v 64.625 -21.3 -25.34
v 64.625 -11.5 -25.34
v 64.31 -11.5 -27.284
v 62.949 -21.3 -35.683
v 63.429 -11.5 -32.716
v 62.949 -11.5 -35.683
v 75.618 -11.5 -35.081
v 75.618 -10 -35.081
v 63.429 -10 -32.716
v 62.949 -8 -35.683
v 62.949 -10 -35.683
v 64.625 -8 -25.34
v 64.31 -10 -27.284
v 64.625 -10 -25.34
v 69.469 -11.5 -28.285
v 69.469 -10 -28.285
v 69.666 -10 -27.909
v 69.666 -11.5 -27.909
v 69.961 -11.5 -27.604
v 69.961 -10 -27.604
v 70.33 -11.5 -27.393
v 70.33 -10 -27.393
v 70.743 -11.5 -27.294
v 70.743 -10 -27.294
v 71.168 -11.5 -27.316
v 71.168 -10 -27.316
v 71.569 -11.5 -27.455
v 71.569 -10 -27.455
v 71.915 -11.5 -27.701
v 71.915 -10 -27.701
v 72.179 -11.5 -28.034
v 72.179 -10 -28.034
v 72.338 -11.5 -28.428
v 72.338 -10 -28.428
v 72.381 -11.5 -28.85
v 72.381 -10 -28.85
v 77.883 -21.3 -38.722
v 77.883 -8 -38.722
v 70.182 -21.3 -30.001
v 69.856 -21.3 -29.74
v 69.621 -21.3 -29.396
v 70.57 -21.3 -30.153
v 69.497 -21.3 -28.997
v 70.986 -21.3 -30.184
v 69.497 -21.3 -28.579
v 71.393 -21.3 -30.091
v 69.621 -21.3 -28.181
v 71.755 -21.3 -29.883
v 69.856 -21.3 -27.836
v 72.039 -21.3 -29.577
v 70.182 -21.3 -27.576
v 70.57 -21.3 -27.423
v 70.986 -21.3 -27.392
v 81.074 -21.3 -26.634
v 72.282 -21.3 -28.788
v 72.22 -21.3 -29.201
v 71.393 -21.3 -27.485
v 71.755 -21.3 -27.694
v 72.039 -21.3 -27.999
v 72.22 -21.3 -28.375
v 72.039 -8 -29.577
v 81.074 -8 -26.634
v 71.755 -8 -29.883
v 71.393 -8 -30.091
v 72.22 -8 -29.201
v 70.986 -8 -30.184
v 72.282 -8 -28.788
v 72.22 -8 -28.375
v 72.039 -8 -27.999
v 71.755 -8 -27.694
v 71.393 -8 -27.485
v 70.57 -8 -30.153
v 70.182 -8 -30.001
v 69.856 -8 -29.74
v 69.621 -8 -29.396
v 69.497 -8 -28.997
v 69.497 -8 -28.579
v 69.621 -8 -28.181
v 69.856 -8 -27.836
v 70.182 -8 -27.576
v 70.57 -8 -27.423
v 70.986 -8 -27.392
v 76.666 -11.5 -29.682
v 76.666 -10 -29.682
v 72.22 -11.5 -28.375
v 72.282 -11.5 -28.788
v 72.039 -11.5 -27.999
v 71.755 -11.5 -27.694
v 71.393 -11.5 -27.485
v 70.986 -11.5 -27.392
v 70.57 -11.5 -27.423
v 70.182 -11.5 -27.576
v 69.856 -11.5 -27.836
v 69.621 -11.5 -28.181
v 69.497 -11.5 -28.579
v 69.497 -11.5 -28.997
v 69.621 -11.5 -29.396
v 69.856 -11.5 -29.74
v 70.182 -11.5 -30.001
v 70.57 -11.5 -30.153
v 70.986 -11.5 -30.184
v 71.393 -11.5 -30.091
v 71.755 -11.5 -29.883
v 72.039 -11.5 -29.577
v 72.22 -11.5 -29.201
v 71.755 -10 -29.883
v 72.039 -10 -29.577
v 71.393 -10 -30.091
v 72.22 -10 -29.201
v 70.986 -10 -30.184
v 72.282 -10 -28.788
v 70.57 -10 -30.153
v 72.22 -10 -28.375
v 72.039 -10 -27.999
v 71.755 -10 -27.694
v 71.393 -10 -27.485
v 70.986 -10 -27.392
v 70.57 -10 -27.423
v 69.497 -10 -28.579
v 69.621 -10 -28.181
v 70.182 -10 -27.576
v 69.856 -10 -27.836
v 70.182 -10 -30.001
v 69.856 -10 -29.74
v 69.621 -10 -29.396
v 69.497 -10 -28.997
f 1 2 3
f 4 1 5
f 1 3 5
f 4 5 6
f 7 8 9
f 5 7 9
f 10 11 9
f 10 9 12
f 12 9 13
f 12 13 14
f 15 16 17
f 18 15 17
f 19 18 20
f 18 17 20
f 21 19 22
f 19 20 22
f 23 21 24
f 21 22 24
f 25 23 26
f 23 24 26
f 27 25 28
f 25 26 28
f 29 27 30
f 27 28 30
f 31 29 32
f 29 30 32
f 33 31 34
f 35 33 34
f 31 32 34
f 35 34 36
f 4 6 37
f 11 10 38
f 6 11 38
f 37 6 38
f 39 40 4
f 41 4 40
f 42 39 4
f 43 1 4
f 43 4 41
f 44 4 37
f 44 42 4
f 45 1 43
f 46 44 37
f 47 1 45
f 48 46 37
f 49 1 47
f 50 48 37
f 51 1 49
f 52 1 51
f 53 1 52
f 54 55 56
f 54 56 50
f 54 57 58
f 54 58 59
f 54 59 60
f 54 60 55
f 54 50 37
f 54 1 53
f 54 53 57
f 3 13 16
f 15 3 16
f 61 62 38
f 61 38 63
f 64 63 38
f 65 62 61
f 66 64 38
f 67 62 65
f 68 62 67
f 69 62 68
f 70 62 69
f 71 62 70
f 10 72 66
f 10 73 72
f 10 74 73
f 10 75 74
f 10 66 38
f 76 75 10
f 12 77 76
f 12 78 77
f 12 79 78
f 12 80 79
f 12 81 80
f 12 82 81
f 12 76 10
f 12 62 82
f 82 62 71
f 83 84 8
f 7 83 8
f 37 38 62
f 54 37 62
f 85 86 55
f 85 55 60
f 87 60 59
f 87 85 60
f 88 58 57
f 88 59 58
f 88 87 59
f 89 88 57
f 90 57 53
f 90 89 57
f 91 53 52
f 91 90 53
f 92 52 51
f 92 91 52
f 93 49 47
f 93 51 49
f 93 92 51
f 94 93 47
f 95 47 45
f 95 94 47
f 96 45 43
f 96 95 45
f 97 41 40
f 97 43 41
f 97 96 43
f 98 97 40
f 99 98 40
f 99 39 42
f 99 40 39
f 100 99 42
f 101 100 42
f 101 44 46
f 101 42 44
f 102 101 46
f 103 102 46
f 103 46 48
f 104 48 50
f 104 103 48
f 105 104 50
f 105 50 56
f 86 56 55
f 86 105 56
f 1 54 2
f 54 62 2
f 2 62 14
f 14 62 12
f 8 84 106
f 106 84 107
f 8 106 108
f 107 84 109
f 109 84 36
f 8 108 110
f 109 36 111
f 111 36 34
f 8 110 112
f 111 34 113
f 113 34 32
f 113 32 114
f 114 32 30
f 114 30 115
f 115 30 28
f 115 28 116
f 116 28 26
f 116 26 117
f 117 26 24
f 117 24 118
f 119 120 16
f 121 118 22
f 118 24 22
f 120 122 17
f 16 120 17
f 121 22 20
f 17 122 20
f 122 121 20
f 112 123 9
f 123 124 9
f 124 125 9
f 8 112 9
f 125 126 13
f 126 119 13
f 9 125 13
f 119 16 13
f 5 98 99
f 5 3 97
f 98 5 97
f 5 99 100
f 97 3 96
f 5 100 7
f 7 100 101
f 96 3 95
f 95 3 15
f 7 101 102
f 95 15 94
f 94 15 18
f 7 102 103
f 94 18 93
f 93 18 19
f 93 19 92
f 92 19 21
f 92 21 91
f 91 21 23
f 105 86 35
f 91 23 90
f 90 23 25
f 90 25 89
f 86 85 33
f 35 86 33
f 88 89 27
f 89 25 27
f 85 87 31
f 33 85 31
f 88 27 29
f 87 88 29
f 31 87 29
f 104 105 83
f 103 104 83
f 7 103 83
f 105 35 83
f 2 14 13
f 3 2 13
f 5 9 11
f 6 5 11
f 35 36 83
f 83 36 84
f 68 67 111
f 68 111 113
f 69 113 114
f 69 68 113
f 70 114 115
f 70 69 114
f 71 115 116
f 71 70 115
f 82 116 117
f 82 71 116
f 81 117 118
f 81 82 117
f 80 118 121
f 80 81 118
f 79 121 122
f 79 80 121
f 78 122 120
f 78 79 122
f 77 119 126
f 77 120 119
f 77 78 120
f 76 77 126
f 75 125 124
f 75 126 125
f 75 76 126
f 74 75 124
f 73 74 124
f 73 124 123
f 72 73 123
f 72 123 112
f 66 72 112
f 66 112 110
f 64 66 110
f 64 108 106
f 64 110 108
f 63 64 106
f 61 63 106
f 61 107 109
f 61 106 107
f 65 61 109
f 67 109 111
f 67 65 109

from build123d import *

# Parameters (mm, degrees)
F0_R      = 7.5
F1_DEPTH  = 10
F4_DEPTH  = 1.5
F6_DEPTH  = 2
F8_DEPTH  = 9.8
F10_DEPTH = 25


with BuildPart() as f1:
    # F0 (on Front) → F1 (new body)
    with BuildSketch(Plane.XZ):
        Circle(F0_R)
        with BuildLine():
            ThreePointArc((-0.1283063228, 4.3981288621), (0, 4.4), (0.1283063228, 4.3981288621))
            ThreePointArc((0.1283063228, 4.3981288621), (0.2239147081, 4.4290007991), (0.2785931947, 4.5132878262))
            Line((0.2785931947, 4.5132878262), (0.4192344048, 5.1033676473))
            ThreePointArc((0.4192344048, 5.1033676473), (0.478862258, 5.1912888485), (0.5817691739, 5.2176665885))
            ThreePointArc((0.5817691739, 5.2176665885), (1.0242241906, 5.1491227221), (1.4592299266, 5.0431287929))
            ThreePointArc((1.4592299266, 5.0431287929), (1.5442091959, 4.979378167), (1.565652162, 4.8753309772))
            Line((1.565652162, 4.8753309772), (1.4697739261, 4.276347247))
            ThreePointArc((1.4697739261, 4.276347247), (1.4880350119, 4.1775516368), (1.5645514634, 4.112441941))
            ThreePointArc((1.5645514634, 4.112441941), (1.6838071024, 4.065069943), (1.8016306345, 4.014240533))
            ThreePointArc((1.8016306345, 4.014240533), (1.9017754436, 4.0061747387), (1.9845470271, 4.063121247))
            Line((1.9845470271, 4.063121247), (2.3402963338, 4.5544628552))
            ThreePointArc((2.3402963338, 4.5544628552), (2.429031274, 4.612872862), (2.5341991914, 4.5978619442))
            ThreePointArc((2.5341991914, 4.5978619442), (2.9167437234, 4.3652154646), (3.2780744987, 4.1008203546))
            ThreePointArc((3.2780744987, 4.1008203546), (3.332188798, 4.0094022978), (3.3121823798, 3.9050693608))
            Line((3.3121823798, 3.9050693608), (2.9943812902, 3.3883715646))
            ThreePointArc((2.9943812902, 3.3883715646), (2.9734448904, 3.2901081075), (3.019220472, 3.2006730138))
            ThreePointArc((3.019220472, 3.2006730138), (3.1112698372, 3.1112698372), (3.2006730138, 3.019220472))
            ThreePointArc((3.2006730138, 3.019220472), (3.2901081075, 2.9734448904), (3.3883715646, 2.9943812902))
            Line((3.3883715646, 2.9943812902), (3.9050693608, 3.3121823798))
            ThreePointArc((3.9050693608, 3.3121823798), (4.0094022978, 3.332188798), (4.1008203546, 3.2780744987))
            ThreePointArc((4.1008203546, 3.2780744987), (4.3652154646, 2.9167437234), (4.5978619442, 2.5341991914))
            ThreePointArc((4.5978619442, 2.5341991914), (4.612872862, 2.429031274), (4.5544628552, 2.3402963338))
            Line((4.5544628552, 2.3402963338), (4.063121247, 1.9845470271))
            ThreePointArc((4.063121247, 1.9845470271), (4.0061747387, 1.9017754436), (4.014240533, 1.8016306345))
            ThreePointArc((4.014240533, 1.8016306345), (4.065069943, 1.6838071024), (4.112441941, 1.5645514634))
            ThreePointArc((4.112441941, 1.5645514634), (4.1775516368, 1.4880350119), (4.276347247, 1.4697739261))
            Line((4.276347247, 1.4697739261), (4.8753309772, 1.565652162))
            ThreePointArc((4.8753309772, 1.565652162), (4.979378167, 1.5442091959), (5.0431287929, 1.4592299266))
            ThreePointArc((5.0431287929, 1.4592299266), (5.1491227221, 1.0242241906), (5.2176665885, 0.5817691739))
            ThreePointArc((5.2176665885, 0.5817691739), (5.1912888485, 0.478862258), (5.1033676473, 0.4192344048))
            Line((5.1033676473, 0.4192344048), (4.5132878262, 0.2785931947))
            ThreePointArc((4.5132878262, 0.2785931947), (4.4290007991, 0.2239147081), (4.3981288621, 0.1283063228))
            ThreePointArc((4.3981288621, 0.1283063228), (4.4, 0), (4.3981288621, -0.1283063228))
            ThreePointArc((4.3981288621, -0.1283063228), (4.4290007991, -0.2239147081), (4.5132878262, -0.2785931947))
            Line((4.5132878262, -0.2785931947), (5.1033676473, -0.4192344048))
            ThreePointArc((5.1033676473, -0.4192344048), (5.1912888485, -0.478862258), (5.2176665885, -0.5817691739))
            ThreePointArc((5.2176665885, -0.5817691739), (5.1491227221, -1.0242241906), (5.0431287929, -1.4592299266))
            ThreePointArc((5.0431287929, -1.4592299266), (4.979378167, -1.5442091959), (4.8753309772, -1.565652162))
            Line((4.8753309772, -1.565652162), (4.276347247, -1.4697739261))
            ThreePointArc((4.276347247, -1.4697739261), (4.1775516368, -1.4880350119), (4.112441941, -1.5645514634))
            ThreePointArc((4.112441941, -1.5645514634), (4.065069943, -1.6838071024), (4.014240533, -1.8016306345))
            ThreePointArc((4.014240533, -1.8016306345), (4.0061747387, -1.9017754436), (4.063121247, -1.9845470271))
            Line((4.063121247, -1.9845470271), (4.5544628552, -2.3402963338))
            ThreePointArc((4.5544628552, -2.3402963338), (4.612872862, -2.429031274), (4.5978619442, -2.5341991914))
            ThreePointArc((4.5978619442, -2.5341991914), (4.3652154646, -2.9167437234), (4.1008203546, -3.2780744987))
            ThreePointArc((4.1008203546, -3.2780744987), (4.0094022978, -3.332188798), (3.9050693608, -3.3121823798))
            Line((3.9050693608, -3.3121823798), (3.3883715646, -2.9943812902))
            ThreePointArc((3.3883715646, -2.9943812902), (3.2901081075, -2.9734448904), (3.2006730138, -3.019220472))
            ThreePointArc((3.2006730138, -3.019220472), (3.1112698372, -3.1112698372), (3.019220472, -3.2006730138))
            ThreePointArc((3.019220472, -3.2006730138), (2.9734448904, -3.2901081075), (2.9943812902, -3.3883715646))
            Line((2.9943812902, -3.3883715646), (3.3121823798, -3.9050693608))
            ThreePointArc((3.3121823798, -3.9050693608), (3.332188798, -4.0094022978), (3.2780744987, -4.1008203546))
            ThreePointArc((3.2780744987, -4.1008203546), (2.9167437234, -4.3652154646), (2.5341991914, -4.5978619442))
            ThreePointArc((2.5341991914, -4.5978619442), (2.429031274, -4.612872862), (2.3402963338, -4.5544628552))
            Line((2.3402963338, -4.5544628552), (1.9845470271, -4.063121247))
            ThreePointArc((1.9845470271, -4.063121247), (1.9017754436, -4.0061747387), (1.8016306345, -4.014240533))
            ThreePointArc((1.8016306345, -4.014240533), (1.6838071024, -4.065069943), (1.5645514634, -4.112441941))
            ThreePointArc((1.5645514634, -4.112441941), (1.4880350119, -4.1775516368), (1.4697739261, -4.276347247))
            Line((1.4697739261, -4.276347247), (1.565652162, -4.8753309772))
            ThreePointArc((1.565652162, -4.8753309772), (1.5442091959, -4.979378167), (1.4592299266, -5.0431287929))
            ThreePointArc((1.4592299266, -5.0431287929), (1.0242241906, -5.1491227221), (0.5817691739, -5.2176665885))
            ThreePointArc((0.5817691739, -5.2176665885), (0.478862258, -5.1912888485), (0.4192344048, -5.1033676473))
            Line((0.4192344048, -5.1033676473), (0.2785931947, -4.5132878262))
            ThreePointArc((0.2785931947, -4.5132878262), (0.2239147081, -4.4290007991), (0.1283063228, -4.3981288621))
            ThreePointArc((0.1283063228, -4.3981288621), (0, -4.4), (-0.1283063228, -4.3981288621))
            ThreePointArc((-0.1283063228, -4.3981288621), (-0.2239147081, -4.4290007991), (-0.2785931947, -4.5132878262))
            Line((-0.2785931947, -4.5132878262), (-0.4192344048, -5.1033676473))
            ThreePointArc((-0.4192344048, -5.1033676473), (-0.478862258, -5.1912888485), (-0.5817691739, -5.2176665885))
            ThreePointArc((-0.5817691739, -5.2176665885), (-1.0242241906, -5.1491227221), (-1.4592299266, -5.0431287929))
            ThreePointArc((-1.4592299266, -5.0431287929), (-1.5442091959, -4.979378167), (-1.565652162, -4.8753309772))
            Line((-1.565652162, -4.8753309772), (-1.4697739261, -4.276347247))
            ThreePointArc((-1.4697739261, -4.276347247), (-1.4880350119, -4.1775516368), (-1.5645514634, -4.112441941))
            ThreePointArc((-1.5645514634, -4.112441941), (-1.6838071024, -4.065069943), (-1.8016306345, -4.014240533))
            ThreePointArc((-1.8016306345, -4.014240533), (-1.9017754436, -4.0061747387), (-1.9845470271, -4.063121247))
            Line((-1.9845470271, -4.063121247), (-2.3402963338, -4.5544628552))
            ThreePointArc((-2.3402963338, -4.5544628552), (-2.429031274, -4.612872862), (-2.5341991914, -4.5978619442))
            ThreePointArc((-2.5341991914, -4.5978619442), (-2.9167437234, -4.3652154646), (-3.2780744987, -4.1008203546))
            ThreePointArc((-3.2780744987, -4.1008203546), (-3.332188798, -4.0094022978), (-3.3121823798, -3.9050693608))
            Line((-3.3121823798, -3.9050693608), (-2.9943812902, -3.3883715646))
            ThreePointArc((-2.9943812902, -3.3883715646), (-2.9734448904, -3.2901081075), (-3.019220472, -3.2006730138))
            ThreePointArc((-3.019220472, -3.2006730138), (-3.1112698372, -3.1112698372), (-3.2006730138, -3.019220472))
            ThreePointArc((-3.2006730138, -3.019220472), (-3.2901081075, -2.9734448904), (-3.3883715646, -2.9943812902))
            Line((-3.3883715646, -2.9943812902), (-3.9050693608, -3.3121823798))
            ThreePointArc((-3.9050693608, -3.3121823798), (-4.0094022978, -3.332188798), (-4.1008203546, -3.2780744987))
            ThreePointArc((-4.1008203546, -3.2780744987), (-4.3652154646, -2.9167437234), (-4.5978619442, -2.5341991914))
            ThreePointArc((-4.5978619442, -2.5341991914), (-4.612872862, -2.429031274), (-4.5544628552, -2.3402963338))
            Line((-4.5544628552, -2.3402963338), (-4.063121247, -1.9845470271))
            ThreePointArc((-4.063121247, -1.9845470271), (-4.0061747387, -1.9017754436), (-4.014240533, -1.8016306345))
            ThreePointArc((-4.014240533, -1.8016306345), (-4.065069943, -1.6838071024), (-4.112441941, -1.5645514634))
            ThreePointArc((-4.112441941, -1.5645514634), (-4.1775516368, -1.4880350119), (-4.276347247, -1.4697739261))
            Line((-4.276347247, -1.4697739261), (-4.8753309772, -1.565652162))
            ThreePointArc((-4.8753309772, -1.565652162), (-4.979378167, -1.5442091959), (-5.0431287929, -1.4592299266))
            ThreePointArc((-5.0431287929, -1.4592299266), (-5.1491227221, -1.0242241906), (-5.2176665885, -0.5817691739))
            ThreePointArc((-5.2176665885, -0.5817691739), (-5.1912888485, -0.478862258), (-5.1033676473, -0.4192344048))
            Line((-5.1033676473, -0.4192344048), (-4.5132878262, -0.2785931947))
            ThreePointArc((-4.5132878262, -0.2785931947), (-4.4290007991, -0.2239147081), (-4.3981288621, -0.1283063228))
            ThreePointArc((-4.3981288621, -0.1283063228), (-4.4, 0), (-4.3981288621, 0.1283063228))
            ThreePointArc((-4.3981288621, 0.1283063228), (-4.4290007991, 0.2239147081), (-4.5132878262, 0.2785931947))
            Line((-4.5132878262, 0.2785931947), (-5.1033676473, 0.4192344048))
            ThreePointArc((-5.1033676473, 0.4192344048), (-5.1912888485, 0.478862258), (-5.2176665885, 0.5817691739))
            ThreePointArc((-5.2176665885, 0.5817691739), (-5.1491227221, 1.0242241906), (-5.0431287929, 1.4592299266))
            ThreePointArc((-5.0431287929, 1.4592299266), (-4.979378167, 1.5442091959), (-4.8753309772, 1.565652162))
            Line((-4.8753309772, 1.565652162), (-4.276347247, 1.4697739261))
            ThreePointArc((-4.276347247, 1.4697739261), (-4.1775516368, 1.4880350119), (-4.112441941, 1.5645514634))
            ThreePointArc((-4.112441941, 1.5645514634), (-4.065069943, 1.6838071024), (-4.014240533, 1.8016306345))
            ThreePointArc((-4.014240533, 1.8016306345), (-4.0061747387, 1.9017754436), (-4.063121247, 1.9845470271))
            Line((-4.063121247, 1.9845470271), (-4.5544628552, 2.3402963338))
            ThreePointArc((-4.5544628552, 2.3402963338), (-4.612872862, 2.429031274), (-4.5978619442, 2.5341991914))
            ThreePointArc((-4.5978619442, 2.5341991914), (-4.3652154646, 2.9167437234), (-4.1008203546, 3.2780744987))
            ThreePointArc((-4.1008203546, 3.2780744987), (-4.0094022978, 3.332188798), (-3.9050693608, 3.3121823798))
            Line((-3.9050693608, 3.3121823798), (-3.3883715646, 2.9943812902))
            ThreePointArc((-3.3883715646, 2.9943812902), (-3.2901081075, 2.9734448904), (-3.2006730138, 3.019220472))
            ThreePointArc((-3.2006730138, 3.019220472), (-3.1112698372, 3.1112698372), (-3.019220472, 3.2006730138))
            ThreePointArc((-3.019220472, 3.2006730138), (-2.9734448904, 3.2901081075), (-2.9943812902, 3.3883715646))
            Line((-2.9943812902, 3.3883715646), (-3.3121823798, 3.9050693608))
            ThreePointArc((-3.3121823798, 3.9050693608), (-3.332188798, 4.0094022978), (-3.2780744987, 4.1008203546))
            ThreePointArc((-3.2780744987, 4.1008203546), (-2.9167437234, 4.3652154646), (-2.5341991914, 4.5978619442))
            ThreePointArc((-2.5341991914, 4.5978619442), (-2.429031274, 4.612872862), (-2.3402963338, 4.5544628552))
            Line((-2.3402963338, 4.5544628552), (-1.9845470271, 4.063121247))
            ThreePointArc((-1.9845470271, 4.063121247), (-1.9017754436, 4.0061747387), (-1.8016306345, 4.014240533))
            ThreePointArc((-1.8016306345, 4.014240533), (-1.6838071024, 4.065069943), (-1.5645514634, 4.112441941))
            ThreePointArc((-1.5645514634, 4.112441941), (-1.4880350119, 4.1775516368), (-1.4697739261, 4.276347247))
            Line((-1.4697739261, 4.276347247), (-1.565652162, 4.8753309772))
            ThreePointArc((-1.565652162, 4.8753309772), (-1.5442091959, 4.979378167), (-1.4592299266, 5.0431287929))
            ThreePointArc((-1.4592299266, 5.0431287929), (-1.0242241906, 5.1491227221), (-0.5817691739, 5.2176665885))
            ThreePointArc((-0.5817691739, 5.2176665885), (-0.478862258, 5.1912888485), (-0.4192344048, 5.1033676473))
            Line((-0.4192344048, 5.1033676473), (-0.2785931947, 4.5132878262))
            ThreePointArc((-0.2785931947, 4.5132878262), (-0.2239147081, 4.4290007991), (-0.1283063228, 4.3981288621))
        make_face(mode=Mode.SUBTRACT)
    extrude(amount=F1_DEPTH)


with BuildPart() as f4:
    # F2 (on face) → F4 (new body)
    with BuildSketch(Plane.XZ.offset(10)):
        with BuildLine():
            ThreePointArc((69.4686499737, -28.2852508226), (71.1676063573, -27.3155576924), (72.3805656575, -28.8503173792))
            Line((72.3805656575, -28.8503173792), (76.6659975052, -29.6819191426))
            Line((76.6659975052, -29.6819191426), (75.6182499343, -35.0811991898))
            Line((75.6182499343, -35.0811991898), (63.4294299308, -32.7159196639))
            Line((63.4294299308, -32.7159196639), (62.9485293155, -35.6833715753))
            Line((62.9485293155, -35.6833715753), (77.882968734, -38.7218176156))
            Line((77.882968734, -38.7218176156), (81.0739637004, -26.6341569648))
            Line((81.0739637004, -26.6341569648), (64.6248276938, -25.3395818853))
            Line((64.6248276938, -25.3395818853), (64.3096957687, -27.2841392505))
            Line((64.3096957687, -27.2841392505), (69.4686499737, -28.2852508226))
        make_face()
    extrude(amount=F4_DEPTH)

    # F5 (on face) → F6 (join)
    with BuildSketch(Plane(origin=(0, -10, 0), x_dir=(-1, 0, 0), z_dir=(0, 1, 0))):
        Polygon((-62.9485293155, -35.6833715753), (-64.6248276938, -25.3395818853), (-81.0739637004, -26.6341569648), (-77.882968734, -38.7218176156), align=None)
    extrude(amount=F6_DEPTH)

    # F7 (on face) → F8 (join)
    with BuildSketch(Plane.XZ.offset(11.5)):
        Polygon((77.882968734, -38.7218176156), (81.0739637004, -26.6341569648), (64.6248276938, -25.3395818853), (62.9485293155, -35.6833715753), align=None)
    extrude(amount=F8_DEPTH)

    # F9 (on Front) → F10 (cut)
    with BuildSketch(Plane.XZ):
        with BuildLine():
            ThreePointArc((69.48186, -28.78809), (70.88186, -30.18809), (72.28186, -28.78809))
            ThreePointArc((72.28186, -28.78809), (70.88186, -27.38809), (69.48186, -28.78809))
        make_face()
    extrude(amount=F10_DEPTH, mode=Mode.SUBTRACT)


solid = f4.part
